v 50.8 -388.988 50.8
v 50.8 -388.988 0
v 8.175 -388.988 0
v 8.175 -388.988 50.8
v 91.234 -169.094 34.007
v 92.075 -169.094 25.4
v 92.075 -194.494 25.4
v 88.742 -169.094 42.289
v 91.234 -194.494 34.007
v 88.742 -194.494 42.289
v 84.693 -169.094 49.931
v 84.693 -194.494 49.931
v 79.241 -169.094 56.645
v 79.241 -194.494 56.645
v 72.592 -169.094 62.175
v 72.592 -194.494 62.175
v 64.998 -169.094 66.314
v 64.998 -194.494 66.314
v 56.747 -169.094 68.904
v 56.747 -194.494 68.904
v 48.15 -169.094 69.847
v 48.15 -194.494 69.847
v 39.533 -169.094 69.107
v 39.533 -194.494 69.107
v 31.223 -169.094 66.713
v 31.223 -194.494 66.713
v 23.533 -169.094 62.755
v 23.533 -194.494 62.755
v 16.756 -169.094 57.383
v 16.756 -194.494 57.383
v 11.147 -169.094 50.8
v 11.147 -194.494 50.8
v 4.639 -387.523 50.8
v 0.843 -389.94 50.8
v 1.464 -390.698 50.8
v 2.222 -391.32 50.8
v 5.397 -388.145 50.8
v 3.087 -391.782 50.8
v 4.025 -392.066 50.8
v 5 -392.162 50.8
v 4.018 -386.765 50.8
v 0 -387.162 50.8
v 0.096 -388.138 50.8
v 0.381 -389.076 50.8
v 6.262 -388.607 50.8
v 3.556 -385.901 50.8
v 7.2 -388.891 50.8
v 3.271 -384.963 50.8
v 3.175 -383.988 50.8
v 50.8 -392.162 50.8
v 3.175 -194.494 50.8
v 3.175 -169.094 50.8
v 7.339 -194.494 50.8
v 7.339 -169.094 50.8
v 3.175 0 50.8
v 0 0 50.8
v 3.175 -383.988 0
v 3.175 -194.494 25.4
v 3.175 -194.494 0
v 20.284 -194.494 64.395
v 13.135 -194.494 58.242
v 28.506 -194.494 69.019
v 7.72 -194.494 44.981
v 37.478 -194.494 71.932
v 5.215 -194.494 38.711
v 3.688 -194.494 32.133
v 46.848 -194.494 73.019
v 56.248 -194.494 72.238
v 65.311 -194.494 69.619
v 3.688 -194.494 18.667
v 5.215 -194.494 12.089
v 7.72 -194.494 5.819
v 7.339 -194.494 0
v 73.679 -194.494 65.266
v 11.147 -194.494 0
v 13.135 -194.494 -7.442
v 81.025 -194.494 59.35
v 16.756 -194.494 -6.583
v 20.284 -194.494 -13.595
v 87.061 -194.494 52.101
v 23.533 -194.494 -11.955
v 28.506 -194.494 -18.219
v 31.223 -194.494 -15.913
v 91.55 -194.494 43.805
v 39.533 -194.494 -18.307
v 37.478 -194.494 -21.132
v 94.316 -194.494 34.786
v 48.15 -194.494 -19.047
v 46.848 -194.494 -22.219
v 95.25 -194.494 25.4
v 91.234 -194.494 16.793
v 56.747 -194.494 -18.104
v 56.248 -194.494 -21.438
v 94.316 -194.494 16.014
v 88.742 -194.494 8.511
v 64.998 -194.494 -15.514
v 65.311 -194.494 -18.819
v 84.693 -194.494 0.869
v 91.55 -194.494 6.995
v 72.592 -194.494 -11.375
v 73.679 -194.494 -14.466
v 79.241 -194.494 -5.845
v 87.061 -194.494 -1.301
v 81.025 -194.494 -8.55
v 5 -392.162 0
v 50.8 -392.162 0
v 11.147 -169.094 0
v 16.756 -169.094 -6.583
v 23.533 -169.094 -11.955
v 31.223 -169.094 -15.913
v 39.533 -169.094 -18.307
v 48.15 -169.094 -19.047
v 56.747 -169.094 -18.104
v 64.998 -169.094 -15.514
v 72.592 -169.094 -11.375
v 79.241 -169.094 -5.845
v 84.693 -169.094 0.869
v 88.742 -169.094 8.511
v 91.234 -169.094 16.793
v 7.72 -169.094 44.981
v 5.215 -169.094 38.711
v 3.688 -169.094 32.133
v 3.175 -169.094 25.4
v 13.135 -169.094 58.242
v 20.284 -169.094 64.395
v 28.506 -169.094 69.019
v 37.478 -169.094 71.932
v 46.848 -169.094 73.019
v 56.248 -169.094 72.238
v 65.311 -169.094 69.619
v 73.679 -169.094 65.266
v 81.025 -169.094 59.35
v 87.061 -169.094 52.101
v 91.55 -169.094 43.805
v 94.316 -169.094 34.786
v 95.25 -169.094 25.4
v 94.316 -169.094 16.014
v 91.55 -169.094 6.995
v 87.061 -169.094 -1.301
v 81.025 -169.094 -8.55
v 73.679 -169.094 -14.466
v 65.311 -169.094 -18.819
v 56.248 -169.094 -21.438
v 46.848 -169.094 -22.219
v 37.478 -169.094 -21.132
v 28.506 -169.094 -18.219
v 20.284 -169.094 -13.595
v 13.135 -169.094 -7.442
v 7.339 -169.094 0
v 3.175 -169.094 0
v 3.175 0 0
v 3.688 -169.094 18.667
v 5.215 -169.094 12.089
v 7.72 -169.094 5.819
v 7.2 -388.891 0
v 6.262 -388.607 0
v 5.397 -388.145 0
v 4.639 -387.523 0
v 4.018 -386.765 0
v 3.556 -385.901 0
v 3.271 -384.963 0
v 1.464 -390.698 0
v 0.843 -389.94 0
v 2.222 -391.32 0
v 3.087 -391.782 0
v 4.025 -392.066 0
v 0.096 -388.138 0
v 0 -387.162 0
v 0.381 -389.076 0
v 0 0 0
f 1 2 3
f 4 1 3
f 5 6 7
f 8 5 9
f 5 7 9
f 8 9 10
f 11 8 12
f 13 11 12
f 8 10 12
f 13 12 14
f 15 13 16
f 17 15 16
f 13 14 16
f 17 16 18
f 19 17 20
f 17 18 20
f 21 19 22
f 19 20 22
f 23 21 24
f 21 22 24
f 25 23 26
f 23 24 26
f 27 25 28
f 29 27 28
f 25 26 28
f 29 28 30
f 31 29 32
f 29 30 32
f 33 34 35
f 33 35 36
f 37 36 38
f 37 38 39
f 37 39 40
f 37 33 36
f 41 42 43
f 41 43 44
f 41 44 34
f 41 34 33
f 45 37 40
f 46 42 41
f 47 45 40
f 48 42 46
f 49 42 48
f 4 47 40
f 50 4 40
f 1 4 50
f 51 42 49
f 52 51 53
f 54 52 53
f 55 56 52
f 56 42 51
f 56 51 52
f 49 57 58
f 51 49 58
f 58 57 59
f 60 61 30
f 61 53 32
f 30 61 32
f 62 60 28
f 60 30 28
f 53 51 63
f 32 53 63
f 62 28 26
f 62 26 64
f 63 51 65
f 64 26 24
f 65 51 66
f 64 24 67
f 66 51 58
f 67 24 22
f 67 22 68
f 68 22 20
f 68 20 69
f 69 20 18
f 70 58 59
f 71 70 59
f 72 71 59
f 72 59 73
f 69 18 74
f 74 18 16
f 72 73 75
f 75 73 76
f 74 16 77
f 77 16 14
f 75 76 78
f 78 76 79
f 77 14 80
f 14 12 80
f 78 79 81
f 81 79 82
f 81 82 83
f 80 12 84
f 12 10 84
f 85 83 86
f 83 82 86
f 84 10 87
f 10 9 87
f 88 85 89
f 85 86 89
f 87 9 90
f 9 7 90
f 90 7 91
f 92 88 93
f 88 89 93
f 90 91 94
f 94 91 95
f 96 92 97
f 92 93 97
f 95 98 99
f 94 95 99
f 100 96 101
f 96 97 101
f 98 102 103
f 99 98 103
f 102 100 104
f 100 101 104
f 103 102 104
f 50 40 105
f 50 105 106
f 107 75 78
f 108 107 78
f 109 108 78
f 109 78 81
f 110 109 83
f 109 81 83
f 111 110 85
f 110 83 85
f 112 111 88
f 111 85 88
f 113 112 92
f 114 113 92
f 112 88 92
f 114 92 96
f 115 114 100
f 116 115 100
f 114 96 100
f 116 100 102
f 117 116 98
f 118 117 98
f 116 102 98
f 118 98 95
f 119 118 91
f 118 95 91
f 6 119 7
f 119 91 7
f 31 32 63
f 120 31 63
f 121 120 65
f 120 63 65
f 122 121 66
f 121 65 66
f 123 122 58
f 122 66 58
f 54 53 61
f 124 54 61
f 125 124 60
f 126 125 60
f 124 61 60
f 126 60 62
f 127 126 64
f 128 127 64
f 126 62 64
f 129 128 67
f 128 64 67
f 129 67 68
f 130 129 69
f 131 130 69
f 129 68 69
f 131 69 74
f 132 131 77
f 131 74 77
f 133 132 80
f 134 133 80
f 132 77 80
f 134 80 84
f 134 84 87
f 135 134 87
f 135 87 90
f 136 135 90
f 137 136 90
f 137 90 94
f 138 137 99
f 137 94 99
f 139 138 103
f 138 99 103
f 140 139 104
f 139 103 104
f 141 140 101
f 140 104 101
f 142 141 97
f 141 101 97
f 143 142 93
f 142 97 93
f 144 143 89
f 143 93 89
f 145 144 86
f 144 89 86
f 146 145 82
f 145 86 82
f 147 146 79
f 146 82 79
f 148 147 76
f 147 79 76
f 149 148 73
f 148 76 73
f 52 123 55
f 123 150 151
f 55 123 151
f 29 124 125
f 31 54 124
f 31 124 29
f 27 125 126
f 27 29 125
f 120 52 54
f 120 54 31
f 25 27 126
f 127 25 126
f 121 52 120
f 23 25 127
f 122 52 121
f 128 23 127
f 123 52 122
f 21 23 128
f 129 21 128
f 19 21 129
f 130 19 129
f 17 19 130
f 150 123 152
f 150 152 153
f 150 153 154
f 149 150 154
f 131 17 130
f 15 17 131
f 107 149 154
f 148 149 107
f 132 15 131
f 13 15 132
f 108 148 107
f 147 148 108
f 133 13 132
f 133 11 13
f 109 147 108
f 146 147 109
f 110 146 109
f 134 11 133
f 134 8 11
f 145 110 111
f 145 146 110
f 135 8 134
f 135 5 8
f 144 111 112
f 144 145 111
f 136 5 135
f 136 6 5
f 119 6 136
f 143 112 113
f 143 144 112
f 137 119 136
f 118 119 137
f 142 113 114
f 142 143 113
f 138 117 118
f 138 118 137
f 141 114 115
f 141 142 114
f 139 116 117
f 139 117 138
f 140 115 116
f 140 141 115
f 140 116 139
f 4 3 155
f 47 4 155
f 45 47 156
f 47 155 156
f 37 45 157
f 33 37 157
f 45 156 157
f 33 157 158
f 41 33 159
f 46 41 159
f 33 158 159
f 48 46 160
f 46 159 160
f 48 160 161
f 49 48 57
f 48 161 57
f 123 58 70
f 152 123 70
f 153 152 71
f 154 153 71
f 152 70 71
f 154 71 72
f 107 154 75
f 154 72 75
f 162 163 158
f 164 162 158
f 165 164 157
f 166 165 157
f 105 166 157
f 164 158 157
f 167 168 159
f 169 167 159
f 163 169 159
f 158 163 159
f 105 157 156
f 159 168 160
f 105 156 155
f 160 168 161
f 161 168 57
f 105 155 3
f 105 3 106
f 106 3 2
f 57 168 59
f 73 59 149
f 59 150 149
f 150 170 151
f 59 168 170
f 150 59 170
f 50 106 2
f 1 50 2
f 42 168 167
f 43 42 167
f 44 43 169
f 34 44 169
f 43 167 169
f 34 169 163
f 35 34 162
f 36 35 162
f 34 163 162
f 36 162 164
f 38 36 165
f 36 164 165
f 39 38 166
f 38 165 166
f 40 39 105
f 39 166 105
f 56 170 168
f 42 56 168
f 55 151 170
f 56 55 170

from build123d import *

# Parameters (mm, degrees)
BOSS_EXTRUDE1_DEPTH = 50.8
SKETCH2_R           = 44.45
BOSS_EXTRUDE3_DEPTH = 25.4


with BuildPart() as part:
    # Sketch1 → Boss-Extrude1 (new body)
    with BuildSketch(Plane.XY):
        with BuildLine():
            Line((3.175, 0), (0, 0))
            Line((0, 0), (0, -387.1625))
            ThreePointArc((0, -387.1625), (1.464466094, -390.698033906), (5, -392.1625))
            Line((5, -392.1625), (50.8, -392.1625))
            Line((50.8, -392.1625), (50.8, -388.9875))
            Line((50.8, -388.9875), (8.175, -388.9875))
            ThreePointArc((8.175, -388.9875), (4.639466094, -387.523033906), (3.175, -383.9875))
            Line((3.175, -383.9875), (3.175, 0))
        make_face()
    extrude(amount=BOSS_EXTRUDE1_DEPTH)

    # Sketch2 → Boss-Extrude3 (add)
    with BuildSketch(Plane(origin=(0, -194.49375, 0), x_dir=(1, 0, 0), z_dir=(0, 1, 0))):
        with BuildLine():
            Line((3.175, -42.497898263), (3.175, -50.8))
            Line((3.175, -50.8), (7.338766309, -50.8))
            ThreePointArc((7.338766309, -50.8), (95.25, -25.4), (7.338766309, 0))
            Line((7.338766309, 0), (3.175, 0))
            Line((3.175, 0), (3.175, -8.302101737))
            ThreePointArc((3.175, -8.302101737), (0, -25.4), (3.175, -42.497898263))
        make_face()
        with Locations((47.625, -25.4)):
            Circle(SKETCH2_R, mode=Mode.SUBTRACT)
    extrude(amount=BOSS_EXTRUDE3_DEPTH)


solid = part.part
